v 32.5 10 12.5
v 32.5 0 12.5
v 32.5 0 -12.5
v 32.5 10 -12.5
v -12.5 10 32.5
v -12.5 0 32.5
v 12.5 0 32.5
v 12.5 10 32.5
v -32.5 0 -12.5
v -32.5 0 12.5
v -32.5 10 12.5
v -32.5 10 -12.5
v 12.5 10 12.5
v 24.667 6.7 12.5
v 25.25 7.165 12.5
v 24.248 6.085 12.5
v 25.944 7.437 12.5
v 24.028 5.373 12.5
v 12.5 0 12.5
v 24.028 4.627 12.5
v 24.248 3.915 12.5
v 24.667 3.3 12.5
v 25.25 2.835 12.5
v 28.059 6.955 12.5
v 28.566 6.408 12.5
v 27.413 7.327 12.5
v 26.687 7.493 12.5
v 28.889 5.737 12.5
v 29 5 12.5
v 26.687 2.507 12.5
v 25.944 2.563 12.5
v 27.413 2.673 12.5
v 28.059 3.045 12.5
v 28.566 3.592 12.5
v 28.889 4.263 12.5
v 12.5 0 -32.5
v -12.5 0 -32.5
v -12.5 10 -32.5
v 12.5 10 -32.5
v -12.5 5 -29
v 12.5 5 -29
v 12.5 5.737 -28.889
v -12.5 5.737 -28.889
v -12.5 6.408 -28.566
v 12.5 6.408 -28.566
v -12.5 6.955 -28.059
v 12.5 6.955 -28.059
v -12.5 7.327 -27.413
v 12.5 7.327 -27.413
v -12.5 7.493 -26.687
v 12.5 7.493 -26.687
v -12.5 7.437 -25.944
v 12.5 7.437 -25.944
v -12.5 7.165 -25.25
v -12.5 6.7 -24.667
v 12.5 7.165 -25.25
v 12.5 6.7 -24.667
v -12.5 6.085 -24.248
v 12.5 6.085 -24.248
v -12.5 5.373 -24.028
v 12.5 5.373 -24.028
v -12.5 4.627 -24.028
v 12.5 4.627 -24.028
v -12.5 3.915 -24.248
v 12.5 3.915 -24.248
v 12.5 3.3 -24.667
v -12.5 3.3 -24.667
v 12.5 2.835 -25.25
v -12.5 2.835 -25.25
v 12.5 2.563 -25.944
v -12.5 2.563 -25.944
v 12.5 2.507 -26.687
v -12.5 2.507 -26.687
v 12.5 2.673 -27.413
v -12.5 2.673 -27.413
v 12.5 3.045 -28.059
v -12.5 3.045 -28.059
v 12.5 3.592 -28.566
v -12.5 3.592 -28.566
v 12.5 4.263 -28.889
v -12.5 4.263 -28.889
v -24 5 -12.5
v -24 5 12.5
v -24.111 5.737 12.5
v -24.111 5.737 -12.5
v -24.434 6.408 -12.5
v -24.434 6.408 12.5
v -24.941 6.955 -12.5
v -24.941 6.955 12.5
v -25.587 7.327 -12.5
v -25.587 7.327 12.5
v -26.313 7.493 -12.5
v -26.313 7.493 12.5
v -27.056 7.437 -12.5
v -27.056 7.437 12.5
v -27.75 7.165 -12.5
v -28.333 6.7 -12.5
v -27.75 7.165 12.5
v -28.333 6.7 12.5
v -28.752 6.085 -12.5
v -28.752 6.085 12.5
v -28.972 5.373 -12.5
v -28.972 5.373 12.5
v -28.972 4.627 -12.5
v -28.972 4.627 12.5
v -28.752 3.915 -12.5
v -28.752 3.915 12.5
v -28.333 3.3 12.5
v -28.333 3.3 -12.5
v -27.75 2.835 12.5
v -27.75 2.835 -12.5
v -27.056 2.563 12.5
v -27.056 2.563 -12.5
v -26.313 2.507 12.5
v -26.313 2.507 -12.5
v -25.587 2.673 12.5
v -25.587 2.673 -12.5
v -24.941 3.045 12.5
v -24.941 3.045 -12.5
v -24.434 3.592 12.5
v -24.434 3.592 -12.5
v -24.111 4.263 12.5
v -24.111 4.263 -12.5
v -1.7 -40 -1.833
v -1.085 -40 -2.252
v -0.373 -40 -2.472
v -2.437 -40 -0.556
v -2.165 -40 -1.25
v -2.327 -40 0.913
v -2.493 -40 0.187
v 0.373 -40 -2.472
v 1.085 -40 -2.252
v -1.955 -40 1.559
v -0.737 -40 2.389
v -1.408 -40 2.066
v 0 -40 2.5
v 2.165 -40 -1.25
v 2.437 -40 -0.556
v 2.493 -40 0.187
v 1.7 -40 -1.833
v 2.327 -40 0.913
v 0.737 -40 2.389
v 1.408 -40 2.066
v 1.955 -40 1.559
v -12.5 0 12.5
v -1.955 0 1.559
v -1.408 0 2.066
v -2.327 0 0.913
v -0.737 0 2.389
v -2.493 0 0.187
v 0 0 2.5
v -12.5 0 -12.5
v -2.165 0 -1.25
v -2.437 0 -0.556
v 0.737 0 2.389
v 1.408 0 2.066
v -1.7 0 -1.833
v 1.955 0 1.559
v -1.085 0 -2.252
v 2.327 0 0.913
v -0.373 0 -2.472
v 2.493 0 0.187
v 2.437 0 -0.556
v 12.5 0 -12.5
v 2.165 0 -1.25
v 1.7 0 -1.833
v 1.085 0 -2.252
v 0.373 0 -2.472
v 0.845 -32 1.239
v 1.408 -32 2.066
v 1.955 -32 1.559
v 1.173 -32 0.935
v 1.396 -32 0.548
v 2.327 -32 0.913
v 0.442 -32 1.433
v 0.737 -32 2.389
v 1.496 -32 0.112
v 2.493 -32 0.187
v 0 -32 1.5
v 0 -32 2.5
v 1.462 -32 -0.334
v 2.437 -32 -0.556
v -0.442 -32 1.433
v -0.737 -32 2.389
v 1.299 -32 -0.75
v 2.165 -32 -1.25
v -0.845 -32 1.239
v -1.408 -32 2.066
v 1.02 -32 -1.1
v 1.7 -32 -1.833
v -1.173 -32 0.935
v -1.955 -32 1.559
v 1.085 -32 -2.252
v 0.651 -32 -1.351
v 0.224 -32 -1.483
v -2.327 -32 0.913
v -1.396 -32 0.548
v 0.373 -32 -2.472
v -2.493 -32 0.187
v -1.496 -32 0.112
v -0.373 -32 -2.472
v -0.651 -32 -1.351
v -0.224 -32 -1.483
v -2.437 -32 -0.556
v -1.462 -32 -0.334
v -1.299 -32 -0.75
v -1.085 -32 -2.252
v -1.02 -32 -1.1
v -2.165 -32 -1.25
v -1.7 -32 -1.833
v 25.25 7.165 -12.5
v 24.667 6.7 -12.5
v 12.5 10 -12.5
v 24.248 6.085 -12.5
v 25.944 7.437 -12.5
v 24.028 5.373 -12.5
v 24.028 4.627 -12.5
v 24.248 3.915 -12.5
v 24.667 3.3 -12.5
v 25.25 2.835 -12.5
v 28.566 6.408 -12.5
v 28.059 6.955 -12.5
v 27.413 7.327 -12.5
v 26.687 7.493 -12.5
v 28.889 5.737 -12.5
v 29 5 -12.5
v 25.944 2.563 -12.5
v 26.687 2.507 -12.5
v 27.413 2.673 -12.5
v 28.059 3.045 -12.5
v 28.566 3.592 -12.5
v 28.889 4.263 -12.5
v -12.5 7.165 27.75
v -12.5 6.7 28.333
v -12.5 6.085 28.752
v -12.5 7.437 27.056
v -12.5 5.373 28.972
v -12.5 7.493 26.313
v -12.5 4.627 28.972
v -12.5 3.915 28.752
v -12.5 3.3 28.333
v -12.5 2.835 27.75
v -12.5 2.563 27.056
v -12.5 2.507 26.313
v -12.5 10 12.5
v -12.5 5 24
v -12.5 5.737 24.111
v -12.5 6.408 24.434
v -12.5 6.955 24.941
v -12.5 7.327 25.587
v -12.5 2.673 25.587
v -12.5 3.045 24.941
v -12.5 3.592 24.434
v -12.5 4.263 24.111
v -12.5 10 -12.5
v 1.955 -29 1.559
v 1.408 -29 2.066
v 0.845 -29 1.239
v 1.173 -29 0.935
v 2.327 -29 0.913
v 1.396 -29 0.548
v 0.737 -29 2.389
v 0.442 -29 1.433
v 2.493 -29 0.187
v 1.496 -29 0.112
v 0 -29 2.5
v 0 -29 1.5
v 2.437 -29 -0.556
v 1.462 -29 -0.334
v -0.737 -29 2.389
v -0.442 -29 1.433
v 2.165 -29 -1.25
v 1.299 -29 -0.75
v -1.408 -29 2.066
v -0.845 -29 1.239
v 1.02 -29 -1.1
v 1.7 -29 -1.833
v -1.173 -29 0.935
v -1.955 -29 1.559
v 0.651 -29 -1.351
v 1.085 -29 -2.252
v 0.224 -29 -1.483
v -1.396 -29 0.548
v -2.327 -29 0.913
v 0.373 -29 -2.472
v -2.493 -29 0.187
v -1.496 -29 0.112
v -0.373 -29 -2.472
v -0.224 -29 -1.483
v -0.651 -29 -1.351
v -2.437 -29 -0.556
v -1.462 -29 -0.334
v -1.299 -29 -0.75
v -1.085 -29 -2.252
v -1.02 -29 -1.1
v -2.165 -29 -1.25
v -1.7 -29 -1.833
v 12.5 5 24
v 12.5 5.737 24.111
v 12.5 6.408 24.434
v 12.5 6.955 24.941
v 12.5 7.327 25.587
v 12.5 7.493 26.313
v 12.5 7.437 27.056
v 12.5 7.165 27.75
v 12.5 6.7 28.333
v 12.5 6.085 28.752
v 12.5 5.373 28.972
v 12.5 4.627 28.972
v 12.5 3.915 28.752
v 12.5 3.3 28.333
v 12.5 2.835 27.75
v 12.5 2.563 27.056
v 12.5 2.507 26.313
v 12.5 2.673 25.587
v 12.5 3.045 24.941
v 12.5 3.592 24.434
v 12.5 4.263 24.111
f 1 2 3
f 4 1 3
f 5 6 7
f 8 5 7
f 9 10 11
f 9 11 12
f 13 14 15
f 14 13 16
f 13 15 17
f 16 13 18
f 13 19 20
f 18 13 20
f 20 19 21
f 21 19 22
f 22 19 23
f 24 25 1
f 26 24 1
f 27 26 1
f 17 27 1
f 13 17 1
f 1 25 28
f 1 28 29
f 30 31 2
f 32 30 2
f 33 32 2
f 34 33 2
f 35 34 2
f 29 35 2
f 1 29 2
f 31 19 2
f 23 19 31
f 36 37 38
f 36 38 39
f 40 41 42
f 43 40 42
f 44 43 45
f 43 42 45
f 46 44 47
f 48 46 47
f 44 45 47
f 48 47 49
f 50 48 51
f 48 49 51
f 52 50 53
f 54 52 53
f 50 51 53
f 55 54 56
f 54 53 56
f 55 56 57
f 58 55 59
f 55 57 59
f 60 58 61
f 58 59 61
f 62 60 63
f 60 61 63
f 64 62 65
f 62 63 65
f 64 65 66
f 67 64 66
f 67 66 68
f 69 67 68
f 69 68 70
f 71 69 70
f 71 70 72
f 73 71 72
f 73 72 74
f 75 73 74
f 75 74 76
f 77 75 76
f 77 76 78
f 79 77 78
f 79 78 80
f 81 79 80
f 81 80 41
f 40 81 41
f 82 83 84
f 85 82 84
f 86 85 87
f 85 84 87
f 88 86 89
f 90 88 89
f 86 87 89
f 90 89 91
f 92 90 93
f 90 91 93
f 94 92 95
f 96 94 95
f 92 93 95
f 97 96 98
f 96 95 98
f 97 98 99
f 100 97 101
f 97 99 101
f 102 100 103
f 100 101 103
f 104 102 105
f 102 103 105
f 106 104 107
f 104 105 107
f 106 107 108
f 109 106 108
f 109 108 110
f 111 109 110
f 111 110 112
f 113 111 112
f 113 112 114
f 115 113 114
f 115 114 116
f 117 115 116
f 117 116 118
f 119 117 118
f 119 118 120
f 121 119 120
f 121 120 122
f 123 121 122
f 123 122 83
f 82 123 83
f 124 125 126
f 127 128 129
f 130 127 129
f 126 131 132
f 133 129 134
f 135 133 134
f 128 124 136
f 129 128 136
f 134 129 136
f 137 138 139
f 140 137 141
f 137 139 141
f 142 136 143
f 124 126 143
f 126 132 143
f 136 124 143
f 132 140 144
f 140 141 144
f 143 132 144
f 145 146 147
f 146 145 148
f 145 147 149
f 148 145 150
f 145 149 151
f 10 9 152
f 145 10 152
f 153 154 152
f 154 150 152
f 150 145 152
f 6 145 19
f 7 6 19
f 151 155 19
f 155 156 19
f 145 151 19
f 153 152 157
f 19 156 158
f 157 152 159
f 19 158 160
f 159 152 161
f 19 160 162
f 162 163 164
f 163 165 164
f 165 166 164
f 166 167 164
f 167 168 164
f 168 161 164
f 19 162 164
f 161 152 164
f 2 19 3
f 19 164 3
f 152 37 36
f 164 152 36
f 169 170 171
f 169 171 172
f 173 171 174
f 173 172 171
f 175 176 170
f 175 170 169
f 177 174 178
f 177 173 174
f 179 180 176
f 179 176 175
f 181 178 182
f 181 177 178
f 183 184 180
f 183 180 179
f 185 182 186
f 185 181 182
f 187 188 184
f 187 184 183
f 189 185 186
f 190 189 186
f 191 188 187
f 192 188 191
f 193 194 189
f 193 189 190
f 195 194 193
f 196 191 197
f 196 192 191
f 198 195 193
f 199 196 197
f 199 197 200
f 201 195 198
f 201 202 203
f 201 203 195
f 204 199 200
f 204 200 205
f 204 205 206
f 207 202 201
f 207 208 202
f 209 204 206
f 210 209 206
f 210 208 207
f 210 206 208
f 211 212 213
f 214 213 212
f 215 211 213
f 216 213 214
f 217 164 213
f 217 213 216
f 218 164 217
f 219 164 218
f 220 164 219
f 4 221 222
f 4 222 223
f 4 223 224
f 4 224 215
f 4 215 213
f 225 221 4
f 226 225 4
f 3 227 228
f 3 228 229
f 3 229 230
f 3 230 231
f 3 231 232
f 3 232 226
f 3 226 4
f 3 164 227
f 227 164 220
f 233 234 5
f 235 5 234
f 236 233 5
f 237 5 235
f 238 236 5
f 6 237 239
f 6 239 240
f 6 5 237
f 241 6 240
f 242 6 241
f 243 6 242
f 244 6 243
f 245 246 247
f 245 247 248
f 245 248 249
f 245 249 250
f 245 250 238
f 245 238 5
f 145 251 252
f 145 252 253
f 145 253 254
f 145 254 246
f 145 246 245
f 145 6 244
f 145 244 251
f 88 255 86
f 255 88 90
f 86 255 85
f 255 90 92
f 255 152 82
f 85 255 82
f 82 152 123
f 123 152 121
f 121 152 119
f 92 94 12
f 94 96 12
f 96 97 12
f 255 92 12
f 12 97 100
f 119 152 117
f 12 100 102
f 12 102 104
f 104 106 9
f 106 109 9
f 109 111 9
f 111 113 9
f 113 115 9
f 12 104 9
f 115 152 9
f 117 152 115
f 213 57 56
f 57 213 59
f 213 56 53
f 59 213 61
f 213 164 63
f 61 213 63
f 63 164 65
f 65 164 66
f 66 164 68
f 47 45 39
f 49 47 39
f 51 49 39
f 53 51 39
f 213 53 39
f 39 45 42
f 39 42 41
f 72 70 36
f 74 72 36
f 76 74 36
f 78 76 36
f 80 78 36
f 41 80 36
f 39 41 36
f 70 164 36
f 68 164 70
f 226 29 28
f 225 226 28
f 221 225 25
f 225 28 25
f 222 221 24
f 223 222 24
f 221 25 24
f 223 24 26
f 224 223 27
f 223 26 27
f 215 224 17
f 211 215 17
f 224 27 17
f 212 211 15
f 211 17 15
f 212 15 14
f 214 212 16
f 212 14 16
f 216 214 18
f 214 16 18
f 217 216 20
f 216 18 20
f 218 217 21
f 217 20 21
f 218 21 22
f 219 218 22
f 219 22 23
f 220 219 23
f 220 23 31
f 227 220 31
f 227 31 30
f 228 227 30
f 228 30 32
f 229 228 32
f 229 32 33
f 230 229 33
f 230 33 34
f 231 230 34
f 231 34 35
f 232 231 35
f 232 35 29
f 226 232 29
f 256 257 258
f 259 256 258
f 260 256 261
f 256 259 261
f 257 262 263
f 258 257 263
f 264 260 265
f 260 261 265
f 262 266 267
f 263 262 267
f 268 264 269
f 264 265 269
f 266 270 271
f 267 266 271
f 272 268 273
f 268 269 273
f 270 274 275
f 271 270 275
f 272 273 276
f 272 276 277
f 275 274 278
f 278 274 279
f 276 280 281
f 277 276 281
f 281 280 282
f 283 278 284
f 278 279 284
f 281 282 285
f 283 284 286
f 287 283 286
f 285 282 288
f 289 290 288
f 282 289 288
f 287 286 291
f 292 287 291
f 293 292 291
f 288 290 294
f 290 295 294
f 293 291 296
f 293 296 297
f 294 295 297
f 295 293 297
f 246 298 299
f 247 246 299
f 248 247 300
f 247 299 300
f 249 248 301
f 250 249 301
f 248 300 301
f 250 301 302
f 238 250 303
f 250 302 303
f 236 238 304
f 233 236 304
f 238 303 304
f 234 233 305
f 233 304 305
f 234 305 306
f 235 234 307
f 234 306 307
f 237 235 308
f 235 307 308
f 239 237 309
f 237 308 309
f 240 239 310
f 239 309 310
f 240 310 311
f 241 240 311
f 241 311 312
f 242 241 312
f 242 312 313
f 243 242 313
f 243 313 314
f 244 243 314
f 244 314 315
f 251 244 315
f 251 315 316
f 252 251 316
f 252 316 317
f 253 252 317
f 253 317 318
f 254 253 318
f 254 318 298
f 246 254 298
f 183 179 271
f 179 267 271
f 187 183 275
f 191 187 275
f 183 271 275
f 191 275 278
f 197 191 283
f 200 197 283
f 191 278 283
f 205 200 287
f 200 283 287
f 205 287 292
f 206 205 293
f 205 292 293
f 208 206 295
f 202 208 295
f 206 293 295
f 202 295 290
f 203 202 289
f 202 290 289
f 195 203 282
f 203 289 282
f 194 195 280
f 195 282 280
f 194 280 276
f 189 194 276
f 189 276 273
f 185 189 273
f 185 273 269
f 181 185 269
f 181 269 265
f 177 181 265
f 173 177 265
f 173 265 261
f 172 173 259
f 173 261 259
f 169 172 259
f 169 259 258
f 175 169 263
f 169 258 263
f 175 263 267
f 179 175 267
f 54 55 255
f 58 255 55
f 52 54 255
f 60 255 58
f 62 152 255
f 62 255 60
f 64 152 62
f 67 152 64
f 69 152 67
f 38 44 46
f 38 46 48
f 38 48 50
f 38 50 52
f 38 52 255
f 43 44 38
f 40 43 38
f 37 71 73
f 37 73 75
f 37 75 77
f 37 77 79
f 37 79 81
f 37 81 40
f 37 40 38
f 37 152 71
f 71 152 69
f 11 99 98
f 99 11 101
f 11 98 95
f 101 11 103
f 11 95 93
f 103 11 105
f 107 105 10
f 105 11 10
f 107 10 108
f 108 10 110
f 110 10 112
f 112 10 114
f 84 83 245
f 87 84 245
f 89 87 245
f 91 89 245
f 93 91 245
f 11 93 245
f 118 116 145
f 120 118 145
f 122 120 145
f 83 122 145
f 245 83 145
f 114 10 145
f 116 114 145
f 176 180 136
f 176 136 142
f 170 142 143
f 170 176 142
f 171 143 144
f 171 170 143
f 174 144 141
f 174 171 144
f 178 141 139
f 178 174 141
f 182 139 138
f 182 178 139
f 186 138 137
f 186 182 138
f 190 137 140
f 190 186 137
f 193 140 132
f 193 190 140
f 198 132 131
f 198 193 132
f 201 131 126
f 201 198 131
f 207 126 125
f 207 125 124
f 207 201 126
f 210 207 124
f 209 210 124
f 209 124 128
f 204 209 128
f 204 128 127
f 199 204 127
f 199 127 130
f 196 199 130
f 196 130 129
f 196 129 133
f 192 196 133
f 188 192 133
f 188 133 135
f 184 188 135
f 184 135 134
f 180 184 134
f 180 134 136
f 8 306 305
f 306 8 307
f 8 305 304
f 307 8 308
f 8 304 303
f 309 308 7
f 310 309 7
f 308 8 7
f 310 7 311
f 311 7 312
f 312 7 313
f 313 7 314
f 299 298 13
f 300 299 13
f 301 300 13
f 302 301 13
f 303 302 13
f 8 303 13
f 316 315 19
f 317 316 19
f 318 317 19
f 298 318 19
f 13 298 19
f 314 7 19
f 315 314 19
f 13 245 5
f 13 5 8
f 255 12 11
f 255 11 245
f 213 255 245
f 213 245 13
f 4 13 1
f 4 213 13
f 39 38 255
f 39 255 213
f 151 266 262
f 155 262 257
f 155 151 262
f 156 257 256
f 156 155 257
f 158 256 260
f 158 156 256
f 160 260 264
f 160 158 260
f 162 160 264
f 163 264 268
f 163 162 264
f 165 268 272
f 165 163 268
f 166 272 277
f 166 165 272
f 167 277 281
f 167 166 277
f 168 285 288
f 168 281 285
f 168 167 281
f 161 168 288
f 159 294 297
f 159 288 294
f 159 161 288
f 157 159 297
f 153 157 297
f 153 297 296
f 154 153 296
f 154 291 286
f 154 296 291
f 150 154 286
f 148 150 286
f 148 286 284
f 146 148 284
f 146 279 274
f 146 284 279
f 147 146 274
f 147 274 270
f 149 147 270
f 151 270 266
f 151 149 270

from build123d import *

# Parameters (mm, degrees)
SKETCH1_W           = 20
SKETCH1_H           = 25
SKETCH1_W_2         = 25
SKETCH1_H_2         = 20
BOSS_EXTRUDE1_DEPTH = 10
SKETCH2_R           = 2.5
CUT_EXTRUDE1_DEPTH  = 57.402570863
SKETCH3_R           = 2.5
CUT_EXTRUDE2_DEPTH  = 57.402570863
SKETCH4_R           = 2.5
BOSS_EXTRUDE2_DEPTH = 40
SKETCH5_W           = 1
SKETCH5_H           = 3


with BuildPart() as part:
    # Sketch1 → Boss-Extrude1 (new body)
    with BuildSketch(Plane(origin=(0, 0, 0), x_dir=(1, 0, 0), z_dir=(0, 1, 0))):
        with Locations((-22.5, 0)):
            Rectangle(SKETCH1_W, SKETCH1_H)
        with Locations((0, -22.5)):
            Rectangle(SKETCH1_W_2, SKETCH1_H_2)
        Rectangle(SKETCH1_W_2, SKETCH1_H)
        with Locations((0, 22.5)):
            Rectangle(SKETCH1_W_2, SKETCH1_H_2)
        with Locations((22.5, 0)):
            Rectangle(SKETCH1_W, SKETCH1_H)
    extrude(amount=BOSS_EXTRUDE1_DEPTH)

    # Sketch2 → Cut-Extrude1 (cut, through all)
    with BuildSketch(Plane(origin=(12.5, 0, 0), x_dir=(0, 0, -1), z_dir=(1, 0, 0))):
        with Locations((-26.499999999, 5)):
            Circle(SKETCH2_R)
        with Locations((26.499999999, 5)):
            Circle(SKETCH2_R)
    extrude(amount=-CUT_EXTRUDE1_DEPTH, mode=Mode.SUBTRACT)

    # Sketch3 → Cut-Extrude2 (cut, through all)
    with BuildSketch(Plane.XY.offset(12.5)):
        with Locations((26.5, 5)):
            Circle(SKETCH3_R)
        with Locations((-26.5, 5)):
            Circle(SKETCH3_R)
    extrude(amount=-CUT_EXTRUDE2_DEPTH, mode=Mode.SUBTRACT)

    # Sketch4 → Boss-Extrude2 (add)
    with BuildSketch(Plane(origin=(0, 0, 0), x_dir=(1, 0, 0), z_dir=(0, 1, 0))):
        with Locations(Location((0, 0, 0), (0, 0, 270))):
            Circle(SKETCH4_R)
    extrude(amount=-BOSS_EXTRUDE2_DEPTH)

    # Sketch5 → Cut-Revolve1 (revolve, cut)
    with BuildSketch(Plane(origin=(0, 0, 0), x_dir=(0, 0, -1), z_dir=(1, 0, 0)), mode=Mode.PRIVATE) as cut_revolve1_sk:
        with Locations((2, -30.5)):
            Rectangle(SKETCH5_W, SKETCH5_H)
    revolve(cut_revolve1_sk.sketch.rotate(Axis((0, 0, 0), (0, -1, 0)), 180), axis=Axis((0, 0, 0), (0, -1, 0)), mode=Mode.SUBTRACT)


solid = part.part
